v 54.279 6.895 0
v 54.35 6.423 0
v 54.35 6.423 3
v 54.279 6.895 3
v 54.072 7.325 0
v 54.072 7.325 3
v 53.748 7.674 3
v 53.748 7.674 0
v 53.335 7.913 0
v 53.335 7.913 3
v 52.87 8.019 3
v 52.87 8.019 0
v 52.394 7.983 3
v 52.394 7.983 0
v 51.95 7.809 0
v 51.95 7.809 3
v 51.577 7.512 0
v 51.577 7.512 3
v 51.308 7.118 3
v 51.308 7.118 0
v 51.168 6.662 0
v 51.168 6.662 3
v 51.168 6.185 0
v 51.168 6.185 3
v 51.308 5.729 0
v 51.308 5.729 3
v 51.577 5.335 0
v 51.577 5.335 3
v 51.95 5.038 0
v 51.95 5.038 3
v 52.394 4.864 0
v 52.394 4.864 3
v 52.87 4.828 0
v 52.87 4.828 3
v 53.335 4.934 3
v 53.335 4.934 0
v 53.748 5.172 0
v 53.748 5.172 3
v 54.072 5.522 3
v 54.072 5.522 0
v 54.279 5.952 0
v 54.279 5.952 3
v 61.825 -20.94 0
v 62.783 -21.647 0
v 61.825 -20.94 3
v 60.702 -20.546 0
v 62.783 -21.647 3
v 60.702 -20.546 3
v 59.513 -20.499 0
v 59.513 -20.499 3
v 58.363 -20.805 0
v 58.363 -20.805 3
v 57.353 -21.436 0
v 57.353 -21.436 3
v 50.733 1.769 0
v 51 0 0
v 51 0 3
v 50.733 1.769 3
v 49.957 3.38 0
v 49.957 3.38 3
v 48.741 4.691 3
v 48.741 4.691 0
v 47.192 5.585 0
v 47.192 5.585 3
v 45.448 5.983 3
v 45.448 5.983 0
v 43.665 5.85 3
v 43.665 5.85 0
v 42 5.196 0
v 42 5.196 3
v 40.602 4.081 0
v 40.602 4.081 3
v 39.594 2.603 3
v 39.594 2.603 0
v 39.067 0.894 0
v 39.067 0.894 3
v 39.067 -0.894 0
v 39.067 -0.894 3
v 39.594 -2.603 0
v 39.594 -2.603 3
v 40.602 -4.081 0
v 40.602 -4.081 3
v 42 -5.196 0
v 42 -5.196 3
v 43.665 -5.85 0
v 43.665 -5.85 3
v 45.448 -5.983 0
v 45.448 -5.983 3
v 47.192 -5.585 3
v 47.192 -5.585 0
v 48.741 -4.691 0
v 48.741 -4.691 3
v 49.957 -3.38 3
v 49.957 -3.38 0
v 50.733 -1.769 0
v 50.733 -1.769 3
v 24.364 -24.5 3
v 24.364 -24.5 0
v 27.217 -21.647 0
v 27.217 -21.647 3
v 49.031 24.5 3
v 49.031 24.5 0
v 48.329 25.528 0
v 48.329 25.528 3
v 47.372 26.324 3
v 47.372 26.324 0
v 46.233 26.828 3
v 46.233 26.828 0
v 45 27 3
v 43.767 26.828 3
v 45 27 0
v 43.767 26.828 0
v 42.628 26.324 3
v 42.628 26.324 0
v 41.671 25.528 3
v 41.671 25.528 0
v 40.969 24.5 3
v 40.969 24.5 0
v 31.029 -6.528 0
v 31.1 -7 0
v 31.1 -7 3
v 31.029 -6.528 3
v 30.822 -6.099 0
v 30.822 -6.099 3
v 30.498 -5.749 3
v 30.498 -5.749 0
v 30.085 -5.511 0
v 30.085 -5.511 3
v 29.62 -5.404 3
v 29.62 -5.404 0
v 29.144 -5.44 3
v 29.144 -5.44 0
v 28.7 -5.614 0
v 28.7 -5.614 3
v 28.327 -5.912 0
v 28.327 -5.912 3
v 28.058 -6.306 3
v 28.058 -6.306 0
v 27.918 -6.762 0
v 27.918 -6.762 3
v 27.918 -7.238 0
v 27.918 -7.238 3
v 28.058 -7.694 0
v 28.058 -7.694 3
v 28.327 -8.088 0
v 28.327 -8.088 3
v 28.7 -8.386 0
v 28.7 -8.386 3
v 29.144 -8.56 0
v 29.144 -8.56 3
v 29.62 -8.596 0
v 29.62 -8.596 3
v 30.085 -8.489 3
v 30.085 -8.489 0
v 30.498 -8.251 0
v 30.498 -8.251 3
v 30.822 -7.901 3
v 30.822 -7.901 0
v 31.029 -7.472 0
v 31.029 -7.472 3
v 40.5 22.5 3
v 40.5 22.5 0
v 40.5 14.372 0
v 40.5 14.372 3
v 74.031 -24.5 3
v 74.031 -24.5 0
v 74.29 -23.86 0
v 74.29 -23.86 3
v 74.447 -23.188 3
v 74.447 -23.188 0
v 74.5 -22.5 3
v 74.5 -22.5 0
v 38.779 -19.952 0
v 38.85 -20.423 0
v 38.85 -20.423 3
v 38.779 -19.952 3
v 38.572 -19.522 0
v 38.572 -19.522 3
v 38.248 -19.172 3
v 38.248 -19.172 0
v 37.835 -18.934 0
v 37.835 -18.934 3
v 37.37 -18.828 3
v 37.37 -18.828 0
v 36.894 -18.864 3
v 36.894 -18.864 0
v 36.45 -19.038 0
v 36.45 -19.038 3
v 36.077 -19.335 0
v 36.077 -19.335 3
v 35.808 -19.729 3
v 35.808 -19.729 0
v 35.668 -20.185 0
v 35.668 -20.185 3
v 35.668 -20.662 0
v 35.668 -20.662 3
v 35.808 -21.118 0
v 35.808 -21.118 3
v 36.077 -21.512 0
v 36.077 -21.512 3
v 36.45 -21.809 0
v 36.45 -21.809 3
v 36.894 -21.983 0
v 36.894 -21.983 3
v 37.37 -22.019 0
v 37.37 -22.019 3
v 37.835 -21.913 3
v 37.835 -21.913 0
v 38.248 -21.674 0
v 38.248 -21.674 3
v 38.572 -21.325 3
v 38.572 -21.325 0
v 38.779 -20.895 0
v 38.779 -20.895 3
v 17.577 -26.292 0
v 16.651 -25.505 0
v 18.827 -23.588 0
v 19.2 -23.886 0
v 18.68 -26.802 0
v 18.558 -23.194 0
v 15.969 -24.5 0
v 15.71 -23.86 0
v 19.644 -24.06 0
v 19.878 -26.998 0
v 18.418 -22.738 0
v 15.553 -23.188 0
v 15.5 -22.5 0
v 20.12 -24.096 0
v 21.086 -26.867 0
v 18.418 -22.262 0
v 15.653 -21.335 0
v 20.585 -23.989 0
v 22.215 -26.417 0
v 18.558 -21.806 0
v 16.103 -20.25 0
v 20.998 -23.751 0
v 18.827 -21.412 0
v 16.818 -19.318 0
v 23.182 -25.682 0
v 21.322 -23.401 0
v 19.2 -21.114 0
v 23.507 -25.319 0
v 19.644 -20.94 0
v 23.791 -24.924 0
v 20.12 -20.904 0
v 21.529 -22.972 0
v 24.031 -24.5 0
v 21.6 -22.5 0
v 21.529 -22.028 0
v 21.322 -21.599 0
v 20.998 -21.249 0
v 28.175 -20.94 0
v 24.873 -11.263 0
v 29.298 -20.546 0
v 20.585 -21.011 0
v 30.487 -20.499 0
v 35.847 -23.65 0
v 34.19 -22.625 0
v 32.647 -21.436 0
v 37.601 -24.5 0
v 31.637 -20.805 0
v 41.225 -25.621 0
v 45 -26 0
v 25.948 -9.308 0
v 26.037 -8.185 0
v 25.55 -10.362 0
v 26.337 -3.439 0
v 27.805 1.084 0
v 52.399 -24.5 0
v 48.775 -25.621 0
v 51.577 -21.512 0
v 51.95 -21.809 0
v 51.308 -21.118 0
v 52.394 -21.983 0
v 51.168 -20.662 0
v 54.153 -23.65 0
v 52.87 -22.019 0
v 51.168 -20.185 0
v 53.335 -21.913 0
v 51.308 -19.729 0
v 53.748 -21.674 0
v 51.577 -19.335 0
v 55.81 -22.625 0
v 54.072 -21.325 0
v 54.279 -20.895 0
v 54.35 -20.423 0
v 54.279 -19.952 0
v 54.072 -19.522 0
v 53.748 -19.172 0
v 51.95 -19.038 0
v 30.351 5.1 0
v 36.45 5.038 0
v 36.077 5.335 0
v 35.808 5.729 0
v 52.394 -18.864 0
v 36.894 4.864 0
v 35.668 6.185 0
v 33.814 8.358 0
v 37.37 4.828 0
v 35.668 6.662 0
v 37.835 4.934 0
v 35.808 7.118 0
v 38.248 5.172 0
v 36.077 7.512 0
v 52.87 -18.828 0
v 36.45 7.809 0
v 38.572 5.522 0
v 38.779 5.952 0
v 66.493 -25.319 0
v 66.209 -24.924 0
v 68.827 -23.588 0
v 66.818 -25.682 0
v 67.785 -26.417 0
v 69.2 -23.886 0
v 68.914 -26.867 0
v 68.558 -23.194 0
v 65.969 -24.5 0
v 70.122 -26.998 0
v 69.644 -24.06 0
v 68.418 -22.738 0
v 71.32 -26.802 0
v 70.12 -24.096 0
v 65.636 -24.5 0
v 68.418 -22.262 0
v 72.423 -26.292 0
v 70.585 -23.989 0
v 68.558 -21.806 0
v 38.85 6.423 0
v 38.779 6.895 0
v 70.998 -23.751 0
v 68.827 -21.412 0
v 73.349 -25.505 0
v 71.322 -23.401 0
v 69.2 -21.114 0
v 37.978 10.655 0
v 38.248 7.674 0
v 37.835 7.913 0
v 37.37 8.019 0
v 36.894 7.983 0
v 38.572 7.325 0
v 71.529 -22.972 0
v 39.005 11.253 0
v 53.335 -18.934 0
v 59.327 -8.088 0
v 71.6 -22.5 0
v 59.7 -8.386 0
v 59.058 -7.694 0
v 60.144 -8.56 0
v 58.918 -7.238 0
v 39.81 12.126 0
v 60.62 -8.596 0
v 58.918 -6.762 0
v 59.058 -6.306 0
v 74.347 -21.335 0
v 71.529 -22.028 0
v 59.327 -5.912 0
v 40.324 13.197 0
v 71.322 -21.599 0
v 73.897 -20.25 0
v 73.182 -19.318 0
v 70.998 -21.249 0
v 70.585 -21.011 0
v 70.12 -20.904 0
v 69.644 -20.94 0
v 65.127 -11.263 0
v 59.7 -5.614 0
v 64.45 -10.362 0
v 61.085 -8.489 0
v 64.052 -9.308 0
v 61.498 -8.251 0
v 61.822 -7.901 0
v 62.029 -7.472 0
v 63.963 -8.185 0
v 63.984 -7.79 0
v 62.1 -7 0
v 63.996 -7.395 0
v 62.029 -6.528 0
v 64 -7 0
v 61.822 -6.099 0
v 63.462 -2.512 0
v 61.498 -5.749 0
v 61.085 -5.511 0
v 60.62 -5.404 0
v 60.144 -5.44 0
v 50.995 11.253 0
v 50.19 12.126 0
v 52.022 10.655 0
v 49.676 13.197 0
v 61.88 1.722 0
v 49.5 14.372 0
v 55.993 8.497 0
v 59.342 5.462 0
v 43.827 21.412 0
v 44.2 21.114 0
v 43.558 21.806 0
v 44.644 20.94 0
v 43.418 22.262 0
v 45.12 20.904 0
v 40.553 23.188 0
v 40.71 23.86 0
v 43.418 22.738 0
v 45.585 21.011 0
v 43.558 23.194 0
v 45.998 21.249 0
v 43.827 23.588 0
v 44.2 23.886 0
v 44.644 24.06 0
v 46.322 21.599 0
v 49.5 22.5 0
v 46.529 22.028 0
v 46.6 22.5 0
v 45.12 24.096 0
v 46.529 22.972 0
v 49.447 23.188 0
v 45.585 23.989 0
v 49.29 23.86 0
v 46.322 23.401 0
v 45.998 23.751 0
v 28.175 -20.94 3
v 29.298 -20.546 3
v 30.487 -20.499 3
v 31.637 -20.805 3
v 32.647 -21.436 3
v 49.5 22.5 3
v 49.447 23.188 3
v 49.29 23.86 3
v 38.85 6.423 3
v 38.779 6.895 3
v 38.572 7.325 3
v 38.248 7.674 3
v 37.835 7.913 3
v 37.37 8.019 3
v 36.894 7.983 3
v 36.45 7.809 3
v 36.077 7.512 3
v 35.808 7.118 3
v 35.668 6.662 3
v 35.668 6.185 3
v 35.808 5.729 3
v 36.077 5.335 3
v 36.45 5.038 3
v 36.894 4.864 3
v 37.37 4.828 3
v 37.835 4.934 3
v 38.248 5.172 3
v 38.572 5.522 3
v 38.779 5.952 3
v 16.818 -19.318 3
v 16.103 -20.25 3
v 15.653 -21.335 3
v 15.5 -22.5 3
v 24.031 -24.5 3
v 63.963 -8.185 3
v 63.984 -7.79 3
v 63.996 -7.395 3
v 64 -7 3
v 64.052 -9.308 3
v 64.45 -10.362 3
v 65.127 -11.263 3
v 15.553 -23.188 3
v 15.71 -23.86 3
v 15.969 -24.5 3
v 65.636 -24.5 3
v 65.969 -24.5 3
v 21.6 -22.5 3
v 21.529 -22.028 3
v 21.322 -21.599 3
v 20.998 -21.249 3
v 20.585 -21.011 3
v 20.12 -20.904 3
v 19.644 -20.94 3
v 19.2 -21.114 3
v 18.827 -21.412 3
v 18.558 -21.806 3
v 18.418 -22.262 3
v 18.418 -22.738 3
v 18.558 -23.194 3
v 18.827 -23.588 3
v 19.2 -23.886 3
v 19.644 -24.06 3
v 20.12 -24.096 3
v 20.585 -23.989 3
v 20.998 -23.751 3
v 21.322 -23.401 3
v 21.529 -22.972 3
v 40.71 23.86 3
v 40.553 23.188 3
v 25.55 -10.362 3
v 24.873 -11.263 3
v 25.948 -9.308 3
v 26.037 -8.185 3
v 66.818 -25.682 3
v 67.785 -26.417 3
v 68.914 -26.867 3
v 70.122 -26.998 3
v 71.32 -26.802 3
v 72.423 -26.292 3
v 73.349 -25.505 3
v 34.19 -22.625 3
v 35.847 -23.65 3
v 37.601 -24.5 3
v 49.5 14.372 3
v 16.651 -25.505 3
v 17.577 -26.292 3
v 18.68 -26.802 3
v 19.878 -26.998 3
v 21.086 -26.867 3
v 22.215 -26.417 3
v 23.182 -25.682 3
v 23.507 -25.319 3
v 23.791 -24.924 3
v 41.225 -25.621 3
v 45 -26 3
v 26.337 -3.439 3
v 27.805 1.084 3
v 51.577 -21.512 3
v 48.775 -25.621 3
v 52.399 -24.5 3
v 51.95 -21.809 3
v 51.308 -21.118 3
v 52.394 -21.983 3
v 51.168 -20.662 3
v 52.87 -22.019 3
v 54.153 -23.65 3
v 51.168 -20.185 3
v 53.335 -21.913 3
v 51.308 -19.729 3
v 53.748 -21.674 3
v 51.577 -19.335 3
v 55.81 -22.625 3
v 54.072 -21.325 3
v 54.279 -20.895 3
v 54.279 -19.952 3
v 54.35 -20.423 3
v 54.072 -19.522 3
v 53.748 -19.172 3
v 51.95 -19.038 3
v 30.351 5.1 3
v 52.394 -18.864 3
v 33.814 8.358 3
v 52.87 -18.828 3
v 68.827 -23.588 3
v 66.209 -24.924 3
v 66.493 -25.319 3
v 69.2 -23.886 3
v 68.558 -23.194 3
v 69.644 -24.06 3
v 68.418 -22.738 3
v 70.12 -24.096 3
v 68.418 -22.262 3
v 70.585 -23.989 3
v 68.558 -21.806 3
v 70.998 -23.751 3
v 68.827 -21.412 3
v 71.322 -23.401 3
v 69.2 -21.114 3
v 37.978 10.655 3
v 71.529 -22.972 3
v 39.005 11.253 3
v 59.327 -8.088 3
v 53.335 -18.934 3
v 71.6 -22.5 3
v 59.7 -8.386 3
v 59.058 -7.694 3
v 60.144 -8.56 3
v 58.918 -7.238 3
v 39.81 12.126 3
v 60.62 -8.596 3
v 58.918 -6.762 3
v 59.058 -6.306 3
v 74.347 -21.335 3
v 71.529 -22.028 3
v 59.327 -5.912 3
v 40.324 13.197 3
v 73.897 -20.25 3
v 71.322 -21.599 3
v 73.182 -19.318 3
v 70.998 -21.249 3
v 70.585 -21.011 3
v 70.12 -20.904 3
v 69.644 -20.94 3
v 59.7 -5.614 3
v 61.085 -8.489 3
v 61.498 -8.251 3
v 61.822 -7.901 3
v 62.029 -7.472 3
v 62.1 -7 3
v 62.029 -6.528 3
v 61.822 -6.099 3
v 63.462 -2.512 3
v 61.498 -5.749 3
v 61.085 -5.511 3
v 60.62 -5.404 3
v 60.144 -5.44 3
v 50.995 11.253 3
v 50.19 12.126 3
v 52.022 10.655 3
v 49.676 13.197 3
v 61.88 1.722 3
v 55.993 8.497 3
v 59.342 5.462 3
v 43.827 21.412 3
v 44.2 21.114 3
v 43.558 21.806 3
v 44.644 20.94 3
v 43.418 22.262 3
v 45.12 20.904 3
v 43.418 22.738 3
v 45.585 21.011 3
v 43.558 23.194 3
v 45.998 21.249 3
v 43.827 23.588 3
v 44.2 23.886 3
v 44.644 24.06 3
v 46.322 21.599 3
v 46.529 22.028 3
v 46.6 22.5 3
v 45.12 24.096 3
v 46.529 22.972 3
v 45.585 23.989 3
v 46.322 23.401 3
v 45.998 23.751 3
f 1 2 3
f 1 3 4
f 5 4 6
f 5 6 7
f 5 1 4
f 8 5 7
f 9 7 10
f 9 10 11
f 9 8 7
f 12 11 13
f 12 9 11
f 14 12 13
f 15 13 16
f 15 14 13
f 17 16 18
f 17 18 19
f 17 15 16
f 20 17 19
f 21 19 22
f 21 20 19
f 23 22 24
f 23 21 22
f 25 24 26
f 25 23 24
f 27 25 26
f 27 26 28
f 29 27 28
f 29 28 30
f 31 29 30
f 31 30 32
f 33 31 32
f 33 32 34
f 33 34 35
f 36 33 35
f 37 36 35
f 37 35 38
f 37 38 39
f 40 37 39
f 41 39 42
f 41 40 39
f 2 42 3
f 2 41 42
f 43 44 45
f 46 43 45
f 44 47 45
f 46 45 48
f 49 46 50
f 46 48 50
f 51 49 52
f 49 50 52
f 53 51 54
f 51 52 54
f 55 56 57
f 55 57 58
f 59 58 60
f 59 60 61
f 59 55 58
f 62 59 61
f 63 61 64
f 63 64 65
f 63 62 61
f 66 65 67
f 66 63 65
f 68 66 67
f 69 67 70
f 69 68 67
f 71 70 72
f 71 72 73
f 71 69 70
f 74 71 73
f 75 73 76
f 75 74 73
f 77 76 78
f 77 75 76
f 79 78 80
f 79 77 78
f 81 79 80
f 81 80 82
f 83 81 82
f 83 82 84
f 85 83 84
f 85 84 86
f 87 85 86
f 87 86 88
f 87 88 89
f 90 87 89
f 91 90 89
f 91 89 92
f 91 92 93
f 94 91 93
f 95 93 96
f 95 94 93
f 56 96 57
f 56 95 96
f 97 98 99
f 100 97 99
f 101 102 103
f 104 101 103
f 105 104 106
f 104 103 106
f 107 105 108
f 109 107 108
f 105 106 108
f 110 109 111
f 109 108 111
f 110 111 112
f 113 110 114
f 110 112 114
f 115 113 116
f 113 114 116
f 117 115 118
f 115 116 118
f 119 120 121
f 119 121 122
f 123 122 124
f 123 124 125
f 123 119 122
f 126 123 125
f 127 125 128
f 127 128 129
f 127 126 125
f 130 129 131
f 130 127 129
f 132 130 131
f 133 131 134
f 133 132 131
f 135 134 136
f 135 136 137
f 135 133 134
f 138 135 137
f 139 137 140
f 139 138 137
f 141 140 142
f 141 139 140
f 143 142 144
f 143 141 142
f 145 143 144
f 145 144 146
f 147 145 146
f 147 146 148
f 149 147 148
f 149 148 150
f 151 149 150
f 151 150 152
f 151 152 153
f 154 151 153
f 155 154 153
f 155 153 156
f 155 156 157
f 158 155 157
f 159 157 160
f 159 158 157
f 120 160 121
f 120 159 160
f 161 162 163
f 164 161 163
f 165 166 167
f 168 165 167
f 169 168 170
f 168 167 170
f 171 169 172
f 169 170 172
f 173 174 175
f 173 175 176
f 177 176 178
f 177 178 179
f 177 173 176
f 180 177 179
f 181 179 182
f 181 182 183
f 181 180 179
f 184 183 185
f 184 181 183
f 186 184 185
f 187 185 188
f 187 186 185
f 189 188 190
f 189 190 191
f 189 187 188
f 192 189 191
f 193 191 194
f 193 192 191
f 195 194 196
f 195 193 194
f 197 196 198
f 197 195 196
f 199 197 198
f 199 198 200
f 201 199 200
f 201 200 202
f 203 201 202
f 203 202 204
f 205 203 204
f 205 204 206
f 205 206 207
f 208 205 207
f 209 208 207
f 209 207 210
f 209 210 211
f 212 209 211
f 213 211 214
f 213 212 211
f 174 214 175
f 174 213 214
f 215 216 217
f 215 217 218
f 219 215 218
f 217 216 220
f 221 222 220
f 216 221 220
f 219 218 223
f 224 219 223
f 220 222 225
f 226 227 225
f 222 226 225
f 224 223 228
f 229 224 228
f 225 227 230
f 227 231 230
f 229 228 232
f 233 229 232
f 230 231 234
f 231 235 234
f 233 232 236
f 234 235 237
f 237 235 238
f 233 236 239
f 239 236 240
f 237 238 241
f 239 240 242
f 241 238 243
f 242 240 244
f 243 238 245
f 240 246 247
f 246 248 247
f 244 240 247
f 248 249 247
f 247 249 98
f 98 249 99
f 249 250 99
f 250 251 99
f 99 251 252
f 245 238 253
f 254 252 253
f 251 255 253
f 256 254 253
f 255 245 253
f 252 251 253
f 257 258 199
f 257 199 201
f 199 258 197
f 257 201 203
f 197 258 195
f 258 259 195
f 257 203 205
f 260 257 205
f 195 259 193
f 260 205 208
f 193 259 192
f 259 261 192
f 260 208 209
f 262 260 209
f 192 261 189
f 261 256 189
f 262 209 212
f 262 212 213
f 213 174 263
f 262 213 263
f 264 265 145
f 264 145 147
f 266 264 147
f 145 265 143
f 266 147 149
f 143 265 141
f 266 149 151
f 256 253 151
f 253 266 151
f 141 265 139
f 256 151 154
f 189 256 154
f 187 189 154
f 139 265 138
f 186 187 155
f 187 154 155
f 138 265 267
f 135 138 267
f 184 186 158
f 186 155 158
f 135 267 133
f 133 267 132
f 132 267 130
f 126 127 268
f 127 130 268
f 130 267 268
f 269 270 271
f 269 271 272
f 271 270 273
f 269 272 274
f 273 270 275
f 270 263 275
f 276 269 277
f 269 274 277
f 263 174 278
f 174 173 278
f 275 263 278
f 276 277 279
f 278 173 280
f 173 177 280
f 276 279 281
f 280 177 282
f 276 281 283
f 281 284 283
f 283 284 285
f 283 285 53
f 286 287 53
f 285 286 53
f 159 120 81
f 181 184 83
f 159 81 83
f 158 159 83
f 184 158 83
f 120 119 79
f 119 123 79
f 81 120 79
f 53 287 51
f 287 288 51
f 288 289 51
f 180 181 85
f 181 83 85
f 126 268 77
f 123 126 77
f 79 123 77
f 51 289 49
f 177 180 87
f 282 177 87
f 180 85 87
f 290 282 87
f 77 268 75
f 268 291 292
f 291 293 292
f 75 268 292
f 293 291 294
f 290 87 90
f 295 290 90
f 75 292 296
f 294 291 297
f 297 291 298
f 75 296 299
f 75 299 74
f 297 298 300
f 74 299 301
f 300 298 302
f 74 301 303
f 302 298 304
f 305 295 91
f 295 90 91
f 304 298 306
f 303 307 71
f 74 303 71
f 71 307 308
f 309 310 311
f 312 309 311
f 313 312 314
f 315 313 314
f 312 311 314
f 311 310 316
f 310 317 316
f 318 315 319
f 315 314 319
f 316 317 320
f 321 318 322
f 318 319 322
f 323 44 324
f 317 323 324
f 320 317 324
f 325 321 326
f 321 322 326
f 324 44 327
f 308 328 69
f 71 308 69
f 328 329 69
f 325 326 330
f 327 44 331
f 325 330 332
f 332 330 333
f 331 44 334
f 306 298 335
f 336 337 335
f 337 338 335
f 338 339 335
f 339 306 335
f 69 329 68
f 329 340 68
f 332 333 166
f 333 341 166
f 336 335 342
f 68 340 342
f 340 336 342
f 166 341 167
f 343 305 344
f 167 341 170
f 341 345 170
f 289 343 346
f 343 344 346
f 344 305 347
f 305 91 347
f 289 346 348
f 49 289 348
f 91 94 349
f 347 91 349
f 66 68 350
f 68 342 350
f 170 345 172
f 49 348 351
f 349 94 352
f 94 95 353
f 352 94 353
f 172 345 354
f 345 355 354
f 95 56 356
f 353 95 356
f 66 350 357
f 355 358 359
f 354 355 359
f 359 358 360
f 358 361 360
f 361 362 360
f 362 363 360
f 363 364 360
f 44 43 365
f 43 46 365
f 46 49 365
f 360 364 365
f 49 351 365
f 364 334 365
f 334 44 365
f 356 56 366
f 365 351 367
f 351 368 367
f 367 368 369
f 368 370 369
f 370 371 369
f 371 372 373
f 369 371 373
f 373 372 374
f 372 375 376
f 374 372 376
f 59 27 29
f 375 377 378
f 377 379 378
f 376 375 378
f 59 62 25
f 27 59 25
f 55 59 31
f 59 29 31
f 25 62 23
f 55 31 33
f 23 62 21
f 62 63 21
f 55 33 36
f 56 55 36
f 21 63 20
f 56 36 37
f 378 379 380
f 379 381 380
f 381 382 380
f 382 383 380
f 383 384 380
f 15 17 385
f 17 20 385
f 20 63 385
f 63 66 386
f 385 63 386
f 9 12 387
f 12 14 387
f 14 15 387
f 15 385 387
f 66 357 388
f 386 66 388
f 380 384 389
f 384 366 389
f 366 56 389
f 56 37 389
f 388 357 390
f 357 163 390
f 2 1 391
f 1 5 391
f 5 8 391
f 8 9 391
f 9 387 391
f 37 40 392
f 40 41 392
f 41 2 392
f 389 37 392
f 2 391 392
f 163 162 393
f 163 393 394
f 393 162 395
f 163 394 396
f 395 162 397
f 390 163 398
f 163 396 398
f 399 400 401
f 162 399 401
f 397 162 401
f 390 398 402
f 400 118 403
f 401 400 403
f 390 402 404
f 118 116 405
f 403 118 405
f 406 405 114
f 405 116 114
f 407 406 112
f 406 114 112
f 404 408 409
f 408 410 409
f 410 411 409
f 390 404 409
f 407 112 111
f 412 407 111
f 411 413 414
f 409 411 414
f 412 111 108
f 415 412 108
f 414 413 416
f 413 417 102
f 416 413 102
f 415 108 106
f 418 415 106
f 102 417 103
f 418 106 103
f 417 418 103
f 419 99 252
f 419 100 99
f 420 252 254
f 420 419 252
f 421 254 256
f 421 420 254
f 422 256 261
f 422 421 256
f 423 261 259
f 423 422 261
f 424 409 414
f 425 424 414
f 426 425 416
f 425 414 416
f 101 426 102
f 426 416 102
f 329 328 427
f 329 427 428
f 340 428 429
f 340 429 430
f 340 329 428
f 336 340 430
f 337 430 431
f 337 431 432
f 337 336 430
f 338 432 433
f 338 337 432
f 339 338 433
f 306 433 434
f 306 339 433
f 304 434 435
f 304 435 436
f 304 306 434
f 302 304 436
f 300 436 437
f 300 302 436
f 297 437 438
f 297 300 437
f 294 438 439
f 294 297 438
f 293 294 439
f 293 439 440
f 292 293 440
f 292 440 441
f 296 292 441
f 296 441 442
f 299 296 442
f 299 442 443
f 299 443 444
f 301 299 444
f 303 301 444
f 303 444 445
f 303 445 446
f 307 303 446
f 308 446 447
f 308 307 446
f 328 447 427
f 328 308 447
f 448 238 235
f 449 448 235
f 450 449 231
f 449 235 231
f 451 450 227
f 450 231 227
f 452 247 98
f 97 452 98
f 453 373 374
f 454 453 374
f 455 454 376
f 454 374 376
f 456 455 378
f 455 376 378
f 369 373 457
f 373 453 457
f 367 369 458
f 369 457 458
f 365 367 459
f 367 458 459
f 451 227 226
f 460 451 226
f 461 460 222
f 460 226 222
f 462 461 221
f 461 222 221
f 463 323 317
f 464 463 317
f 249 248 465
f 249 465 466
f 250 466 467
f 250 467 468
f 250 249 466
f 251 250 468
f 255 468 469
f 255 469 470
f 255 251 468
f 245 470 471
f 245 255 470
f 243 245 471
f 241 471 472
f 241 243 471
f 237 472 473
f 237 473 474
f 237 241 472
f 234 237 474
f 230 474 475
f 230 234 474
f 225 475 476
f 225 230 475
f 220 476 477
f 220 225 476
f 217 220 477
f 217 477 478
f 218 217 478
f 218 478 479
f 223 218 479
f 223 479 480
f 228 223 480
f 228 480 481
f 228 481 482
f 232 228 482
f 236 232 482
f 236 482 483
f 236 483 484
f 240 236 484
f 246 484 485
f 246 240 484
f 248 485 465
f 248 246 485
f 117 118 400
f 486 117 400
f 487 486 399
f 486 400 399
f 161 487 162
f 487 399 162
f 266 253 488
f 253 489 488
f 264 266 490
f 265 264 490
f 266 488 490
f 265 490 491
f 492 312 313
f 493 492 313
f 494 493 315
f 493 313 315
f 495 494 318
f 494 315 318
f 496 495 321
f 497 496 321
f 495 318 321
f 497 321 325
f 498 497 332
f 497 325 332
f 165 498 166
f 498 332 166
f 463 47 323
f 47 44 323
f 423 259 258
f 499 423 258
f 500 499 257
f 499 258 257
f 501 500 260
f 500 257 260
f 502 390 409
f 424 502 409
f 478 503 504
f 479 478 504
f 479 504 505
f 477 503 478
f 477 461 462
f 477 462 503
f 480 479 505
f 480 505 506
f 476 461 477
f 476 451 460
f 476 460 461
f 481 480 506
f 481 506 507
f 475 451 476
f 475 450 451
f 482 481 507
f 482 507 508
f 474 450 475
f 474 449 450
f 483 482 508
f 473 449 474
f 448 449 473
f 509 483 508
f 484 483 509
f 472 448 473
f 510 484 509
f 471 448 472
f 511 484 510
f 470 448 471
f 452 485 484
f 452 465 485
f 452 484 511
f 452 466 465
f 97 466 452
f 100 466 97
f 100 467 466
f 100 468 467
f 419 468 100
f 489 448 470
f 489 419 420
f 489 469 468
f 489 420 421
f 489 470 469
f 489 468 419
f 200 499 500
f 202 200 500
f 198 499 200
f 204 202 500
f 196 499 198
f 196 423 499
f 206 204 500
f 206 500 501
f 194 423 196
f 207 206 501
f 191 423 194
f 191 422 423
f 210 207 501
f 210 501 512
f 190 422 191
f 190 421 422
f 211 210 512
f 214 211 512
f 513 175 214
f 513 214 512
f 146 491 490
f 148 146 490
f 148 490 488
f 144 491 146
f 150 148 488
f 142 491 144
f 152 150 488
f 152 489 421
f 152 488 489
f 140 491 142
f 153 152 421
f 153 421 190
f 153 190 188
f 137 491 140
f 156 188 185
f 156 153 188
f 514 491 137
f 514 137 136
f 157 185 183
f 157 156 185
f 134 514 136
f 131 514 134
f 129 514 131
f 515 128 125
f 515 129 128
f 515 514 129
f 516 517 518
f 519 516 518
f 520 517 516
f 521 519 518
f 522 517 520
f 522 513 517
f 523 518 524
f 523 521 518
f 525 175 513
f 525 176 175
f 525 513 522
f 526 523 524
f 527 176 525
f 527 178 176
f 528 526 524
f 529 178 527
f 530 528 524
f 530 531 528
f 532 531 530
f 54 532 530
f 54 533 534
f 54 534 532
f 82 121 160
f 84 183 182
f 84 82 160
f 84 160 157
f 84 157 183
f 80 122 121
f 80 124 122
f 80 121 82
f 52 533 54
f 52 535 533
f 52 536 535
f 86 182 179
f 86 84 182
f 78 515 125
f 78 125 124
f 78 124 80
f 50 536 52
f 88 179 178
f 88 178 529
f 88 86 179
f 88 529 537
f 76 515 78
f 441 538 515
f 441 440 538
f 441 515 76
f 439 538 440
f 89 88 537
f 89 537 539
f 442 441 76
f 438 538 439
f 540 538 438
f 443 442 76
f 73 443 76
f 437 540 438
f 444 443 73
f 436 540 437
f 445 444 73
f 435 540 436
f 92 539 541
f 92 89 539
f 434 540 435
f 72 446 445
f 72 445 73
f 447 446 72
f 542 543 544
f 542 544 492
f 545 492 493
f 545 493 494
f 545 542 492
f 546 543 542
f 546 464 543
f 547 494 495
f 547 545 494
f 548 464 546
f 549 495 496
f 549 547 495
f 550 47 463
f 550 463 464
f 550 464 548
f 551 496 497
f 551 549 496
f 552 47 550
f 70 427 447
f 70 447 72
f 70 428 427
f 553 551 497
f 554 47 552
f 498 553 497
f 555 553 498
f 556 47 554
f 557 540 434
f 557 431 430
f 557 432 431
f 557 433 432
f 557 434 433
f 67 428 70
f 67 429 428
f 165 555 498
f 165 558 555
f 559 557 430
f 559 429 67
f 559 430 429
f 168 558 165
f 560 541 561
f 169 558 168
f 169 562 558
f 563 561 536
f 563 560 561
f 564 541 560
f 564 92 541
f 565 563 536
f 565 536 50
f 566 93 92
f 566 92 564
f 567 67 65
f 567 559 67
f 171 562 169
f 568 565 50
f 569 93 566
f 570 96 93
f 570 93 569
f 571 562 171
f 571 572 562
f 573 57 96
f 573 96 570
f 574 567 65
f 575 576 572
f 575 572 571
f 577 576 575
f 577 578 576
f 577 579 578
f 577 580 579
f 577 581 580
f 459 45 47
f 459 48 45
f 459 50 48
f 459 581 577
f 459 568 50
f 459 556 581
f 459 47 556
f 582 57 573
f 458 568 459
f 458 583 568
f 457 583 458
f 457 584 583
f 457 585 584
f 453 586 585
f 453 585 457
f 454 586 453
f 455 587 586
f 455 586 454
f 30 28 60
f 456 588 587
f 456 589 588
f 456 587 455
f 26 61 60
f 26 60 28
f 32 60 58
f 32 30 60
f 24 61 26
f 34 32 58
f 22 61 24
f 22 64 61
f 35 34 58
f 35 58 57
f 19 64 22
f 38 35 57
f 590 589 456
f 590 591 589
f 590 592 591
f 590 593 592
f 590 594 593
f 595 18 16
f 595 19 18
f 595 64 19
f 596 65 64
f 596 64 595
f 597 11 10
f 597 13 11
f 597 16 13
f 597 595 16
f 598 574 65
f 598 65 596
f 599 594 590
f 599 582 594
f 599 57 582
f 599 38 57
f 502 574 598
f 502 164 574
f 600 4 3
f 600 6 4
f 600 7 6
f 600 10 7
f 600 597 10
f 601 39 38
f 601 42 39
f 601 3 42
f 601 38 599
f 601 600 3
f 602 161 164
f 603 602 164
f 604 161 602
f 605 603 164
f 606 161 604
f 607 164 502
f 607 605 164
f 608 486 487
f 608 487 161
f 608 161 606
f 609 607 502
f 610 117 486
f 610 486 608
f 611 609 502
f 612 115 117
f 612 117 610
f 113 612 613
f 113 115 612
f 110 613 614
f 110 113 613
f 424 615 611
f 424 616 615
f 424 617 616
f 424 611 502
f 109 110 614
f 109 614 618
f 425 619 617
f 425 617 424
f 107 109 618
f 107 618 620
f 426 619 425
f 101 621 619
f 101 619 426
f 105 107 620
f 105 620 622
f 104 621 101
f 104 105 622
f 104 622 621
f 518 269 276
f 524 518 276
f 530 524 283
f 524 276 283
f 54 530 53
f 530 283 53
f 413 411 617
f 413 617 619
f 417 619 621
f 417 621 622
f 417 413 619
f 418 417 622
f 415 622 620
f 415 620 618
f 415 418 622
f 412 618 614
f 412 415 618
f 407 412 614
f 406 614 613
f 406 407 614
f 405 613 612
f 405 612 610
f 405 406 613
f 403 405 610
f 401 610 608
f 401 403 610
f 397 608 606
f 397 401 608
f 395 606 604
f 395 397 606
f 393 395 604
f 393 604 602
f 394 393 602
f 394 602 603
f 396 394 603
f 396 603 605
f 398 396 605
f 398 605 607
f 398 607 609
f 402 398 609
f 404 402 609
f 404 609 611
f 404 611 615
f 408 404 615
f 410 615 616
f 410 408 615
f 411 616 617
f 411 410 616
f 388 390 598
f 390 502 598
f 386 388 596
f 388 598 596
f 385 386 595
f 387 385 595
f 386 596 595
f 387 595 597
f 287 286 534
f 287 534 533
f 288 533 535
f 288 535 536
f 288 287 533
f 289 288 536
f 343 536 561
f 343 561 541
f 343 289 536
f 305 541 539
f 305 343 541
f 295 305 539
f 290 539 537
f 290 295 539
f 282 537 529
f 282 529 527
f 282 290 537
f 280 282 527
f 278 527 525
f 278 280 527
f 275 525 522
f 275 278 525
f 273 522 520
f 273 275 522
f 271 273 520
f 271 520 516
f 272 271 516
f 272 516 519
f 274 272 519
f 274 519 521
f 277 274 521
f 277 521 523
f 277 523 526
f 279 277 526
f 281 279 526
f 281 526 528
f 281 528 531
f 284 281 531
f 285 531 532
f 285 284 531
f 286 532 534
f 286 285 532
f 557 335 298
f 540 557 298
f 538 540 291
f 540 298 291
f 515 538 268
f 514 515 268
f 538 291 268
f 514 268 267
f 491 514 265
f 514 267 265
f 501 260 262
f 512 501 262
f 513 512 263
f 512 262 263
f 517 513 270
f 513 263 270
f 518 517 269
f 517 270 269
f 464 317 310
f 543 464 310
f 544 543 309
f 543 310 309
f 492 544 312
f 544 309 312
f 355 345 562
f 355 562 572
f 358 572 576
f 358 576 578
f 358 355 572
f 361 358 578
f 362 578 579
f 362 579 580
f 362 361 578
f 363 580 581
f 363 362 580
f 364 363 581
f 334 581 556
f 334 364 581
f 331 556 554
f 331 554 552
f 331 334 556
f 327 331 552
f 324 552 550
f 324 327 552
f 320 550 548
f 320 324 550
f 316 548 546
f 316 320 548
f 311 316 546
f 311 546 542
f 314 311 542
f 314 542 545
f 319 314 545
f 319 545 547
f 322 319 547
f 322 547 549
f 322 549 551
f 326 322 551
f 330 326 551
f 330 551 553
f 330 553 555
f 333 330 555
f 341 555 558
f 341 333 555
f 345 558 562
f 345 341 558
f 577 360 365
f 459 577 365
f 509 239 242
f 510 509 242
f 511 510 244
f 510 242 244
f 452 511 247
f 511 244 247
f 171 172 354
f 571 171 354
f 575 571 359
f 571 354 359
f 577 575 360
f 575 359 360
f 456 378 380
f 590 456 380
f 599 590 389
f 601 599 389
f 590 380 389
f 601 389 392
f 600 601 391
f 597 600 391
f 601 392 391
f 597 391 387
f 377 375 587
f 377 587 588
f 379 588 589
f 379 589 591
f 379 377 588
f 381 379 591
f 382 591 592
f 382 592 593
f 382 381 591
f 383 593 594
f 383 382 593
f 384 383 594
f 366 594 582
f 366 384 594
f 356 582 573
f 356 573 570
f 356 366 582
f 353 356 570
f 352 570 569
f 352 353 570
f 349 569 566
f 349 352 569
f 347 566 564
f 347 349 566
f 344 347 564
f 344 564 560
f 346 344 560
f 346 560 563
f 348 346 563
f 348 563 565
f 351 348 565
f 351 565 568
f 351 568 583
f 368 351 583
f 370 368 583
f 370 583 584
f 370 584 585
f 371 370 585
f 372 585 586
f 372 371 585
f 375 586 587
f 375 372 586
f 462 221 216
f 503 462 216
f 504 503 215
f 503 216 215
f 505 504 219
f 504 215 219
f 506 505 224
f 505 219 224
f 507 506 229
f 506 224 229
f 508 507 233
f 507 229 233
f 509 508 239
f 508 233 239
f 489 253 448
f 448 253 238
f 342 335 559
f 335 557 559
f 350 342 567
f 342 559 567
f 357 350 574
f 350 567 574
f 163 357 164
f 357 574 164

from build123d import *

# Parameters (mm, degrees)
SKETCH_1_R      = 1.6
SKETCH_1_R_2    = 6
EXTRUDE_1_DEPTH = 3
FILLET_1_R      = 4


with BuildPart() as part:
    # 草图1 → 凸台-拉伸1 (new body)
    # profile 1 of 13: a face of its own
    with BuildSketch(Plane.XY):
        with BuildLine():
            ThreePointArc((64, -7), (59.941552797, 4.736694594), (49.5, 11.459414942))
            ThreePointArc((49.5, 11.459414942), (45, 12), (40.5, 11.459414942))
            ThreePointArc((40.5, 11.459414942), (29.2006815, 3.553745068), (26.224418371, -9.911620598))
            ThreePointArc((26.224418371, -9.911620598), (27.583310363, -14.593347225), (30.0887682, -18.775192831))
            ThreePointArc((30.0887682, -18.775192831), (33.483334572, -22.111797293), (37.600675707, -24.5))
            Line((37.600675707, -24.5), (52.399324293, -24.5))
            ThreePointArc((52.399324293, -24.5), (56.516665428, -22.111797293), (59.9112318, -18.775192831))
            ThreePointArc((59.9112318, -18.775192831), (62.416689637, -14.593347225), (63.775581629, -9.911620598))
            ThreePointArc((63.775581629, -9.911620598), (63.943812327, -8.460128257), (64, -7))
        make_face()
        with Locations((37.25, -20.423393759)):
            Circle(SKETCH_1_R, mode=Mode.SUBTRACT)
        with Locations((52.75, -20.423393759)):
            Circle(SKETCH_1_R, mode=Mode.SUBTRACT)
        with Locations((29.5, -7)):
            Circle(SKETCH_1_R, mode=Mode.SUBTRACT)
        with Locations((60.5, -7)):
            Circle(SKETCH_1_R, mode=Mode.SUBTRACT)
        with Locations((45, 0)):
            Circle(SKETCH_1_R_2, mode=Mode.SUBTRACT)
        with Locations((37.25, 6.423393759)):
            Circle(SKETCH_1_R, mode=Mode.SUBTRACT)
        with Locations((52.75, 6.423393759)):
            Circle(SKETCH_1_R, mode=Mode.SUBTRACT)
    # profile 2 of 13: a face of its own
    with BuildSketch(Plane.XY):
        with BuildLine():
            ThreePointArc((30.0887682, -18.775192831), (27.583310363, -14.593347225), (26.224418371, -9.911620598))
            Line((26.224418371, -9.911620598), (16.818019485, -19.318019485))
            ThreePointArc((16.818019485, -19.318019485), (21.722075446, -18.342542104), (24.5, -22.5))
            Line((24.5, -22.5), (24.5, -24.363961031))
            Line((24.5, -24.363961031), (30.0887682, -18.775192831))
        make_face()
    # profile 3 of 13: a face of its own
    with BuildSketch(Plane.XY):
        with BuildLine():
            ThreePointArc((24.5, -22.5), (21.722075446, -18.342542104), (16.818019485, -19.318019485))
            ThreePointArc((16.818019485, -19.318019485), (15.842542104, -20.777924554), (15.5, -22.5))
            ThreePointArc((15.5, -22.5), (15.61878556, -23.527112473), (15.968871126, -24.5))
            Line((15.968871126, -24.5), (24.031128874, -24.5))
            ThreePointArc((24.031128874, -24.5), (24.38121444, -23.527112473), (24.5, -22.5))
        make_face()
        with Locations((20, -22.5)):
            Circle(SKETCH_1_R, mode=Mode.SUBTRACT)
    # profile 4 of 13: a face of its own
    with BuildSketch(Plane.XY):
        with BuildLine():
            Line((24.031128874, -24.5), (15.968871126, -24.5))
            ThreePointArc((15.968871126, -24.5), (19.272310012, -26.940773275), (23.181980515, -25.681980515))
            ThreePointArc((23.181980515, -25.681980515), (23.654655422, -25.125546372), (24.031128874, -24.5))
        make_face()
    # profile 5 of 13: a face of its own
    with BuildSketch(Plane.XY):
        with BuildLine():
            ThreePointArc((66.818019485, -25.681980515), (70.727689988, -26.940773275), (74.031128874, -24.5))
            Line((74.031128874, -24.5), (65.968871126, -24.5))
            ThreePointArc((65.968871126, -24.5), (66.345344578, -25.125546372), (66.818019485, -25.681980515))
        make_face()
    # profile 6 of 13: a face of its own
    with BuildSketch(Plane.XY):
        with BuildLine():
            ThreePointArc((65.5, -22.5), (68.277924554, -18.342542104), (73.181980515, -19.318019485))
            Line((73.181980515, -19.318019485), (63.775581629, -9.911620598))
            ThreePointArc((63.775581629, -9.911620598), (62.416689637, -14.593347225), (59.9112318, -18.775192831))
            Line((59.9112318, -18.775192831), (65.5, -24.363961031))
            Line((65.5, -24.363961031), (65.5, -22.5))
        make_face()
    # profile 7 of 13: a face of its own
    with BuildSketch(Plane.XY):
        with BuildLine():
            Line((49.5, 11.459414942), (49.5, 22.5))
            ThreePointArc((49.5, 22.5), (45, 18), (40.5, 22.5))
            Line((40.5, 22.5), (40.5, 11.459414942))
            ThreePointArc((40.5, 11.459414942), (45, 12), (49.5, 11.459414942))
        make_face()
    # profile 8 of 13: a face of its own
    with BuildSketch(Plane.XY):
        with BuildLine():
            ThreePointArc((49.5, 22.5), (49.38121444, 23.527112473), (49.031128874, 24.5))
            Line((49.031128874, 24.5), (40.968871126, 24.5))
            ThreePointArc((40.968871126, 24.5), (40.61878556, 23.527112473), (40.5, 22.5))
            ThreePointArc((40.5, 22.5), (45, 18), (49.5, 22.5))
        make_face()
        with Locations((45, 22.5)):
            Circle(SKETCH_1_R, mode=Mode.SUBTRACT)
    # profile 9 of 13: a face of its own
    with BuildSketch(Plane.XY):
        with BuildLine():
            Line((40.968871126, 24.5), (49.031128874, 24.5))
            ThreePointArc((49.031128874, 24.5), (45, 27), (40.968871126, 24.5))
        make_face()
    # profile 10 of 13: a face of its own
    with BuildSketch(Plane.XY):
        with BuildLine():
            Line((24.5, -24.363961031), (24.5, -22.5))
            ThreePointArc((24.5, -22.5), (24.38121444, -23.527112473), (24.031128874, -24.5))
            Line((24.031128874, -24.5), (24.363961031, -24.5))
            Line((24.363961031, -24.5), (24.5, -24.363961031))
        make_face()
    # profile 11 of 13: a face of its own
    with BuildSketch(Plane.XY):
        with BuildLine():
            Line((65.636038969, -24.5), (65.968871126, -24.5))
            ThreePointArc((65.968871126, -24.5), (65.61878556, -23.527112473), (65.5, -22.5))
            Line((65.5, -22.5), (65.5, -24.363961031))
            Line((65.5, -24.363961031), (65.636038969, -24.5))
        make_face()
    # profile 12 of 13: a face of its own
    with BuildSketch(Plane.XY):
        with BuildLine():
            Line((65.968871126, -24.5), (74.031128874, -24.5))
            ThreePointArc((74.031128874, -24.5), (74.38121444, -23.527112473), (74.5, -22.5))
            ThreePointArc((74.5, -22.5), (74.157457896, -20.777924554), (73.181980515, -19.318019485))
            ThreePointArc((73.181980515, -19.318019485), (68.277924554, -18.342542104), (65.5, -22.5))
            ThreePointArc((65.5, -22.5), (65.61878556, -23.527112473), (65.968871126, -24.5))
        make_face()
        with Locations((70, -22.5)):
            Circle(SKETCH_1_R, mode=Mode.SUBTRACT)
    # profile 13 of 13: a face of its own
    with BuildSketch(Plane.XY):
        with BuildLine():
            ThreePointArc((37.600675707, -24.5), (45, -26), (52.399324293, -24.5))
            Line((52.399324293, -24.5), (37.600675707, -24.5))
        make_face()
    extrude(amount=EXTRUDE_1_DEPTH)

    # 圆角1
    fillet_1_edges = [part.edges().sort_by_distance(p)[0] for p in [
        (59.9112318, -18.775192831, 1.5),
        (30.0887682, -18.775192831, 1.5),
        (26.224418371, -9.911620598, 1.5),
        (40.5, 11.459414942, 1.5),
        (49.5, 11.459414942, 1.5),
        (63.775581629, -9.911620598, 1.5),
    ]]
    fillet(fillet_1_edges, radius=FILLET_1_R)


solid = part.part
